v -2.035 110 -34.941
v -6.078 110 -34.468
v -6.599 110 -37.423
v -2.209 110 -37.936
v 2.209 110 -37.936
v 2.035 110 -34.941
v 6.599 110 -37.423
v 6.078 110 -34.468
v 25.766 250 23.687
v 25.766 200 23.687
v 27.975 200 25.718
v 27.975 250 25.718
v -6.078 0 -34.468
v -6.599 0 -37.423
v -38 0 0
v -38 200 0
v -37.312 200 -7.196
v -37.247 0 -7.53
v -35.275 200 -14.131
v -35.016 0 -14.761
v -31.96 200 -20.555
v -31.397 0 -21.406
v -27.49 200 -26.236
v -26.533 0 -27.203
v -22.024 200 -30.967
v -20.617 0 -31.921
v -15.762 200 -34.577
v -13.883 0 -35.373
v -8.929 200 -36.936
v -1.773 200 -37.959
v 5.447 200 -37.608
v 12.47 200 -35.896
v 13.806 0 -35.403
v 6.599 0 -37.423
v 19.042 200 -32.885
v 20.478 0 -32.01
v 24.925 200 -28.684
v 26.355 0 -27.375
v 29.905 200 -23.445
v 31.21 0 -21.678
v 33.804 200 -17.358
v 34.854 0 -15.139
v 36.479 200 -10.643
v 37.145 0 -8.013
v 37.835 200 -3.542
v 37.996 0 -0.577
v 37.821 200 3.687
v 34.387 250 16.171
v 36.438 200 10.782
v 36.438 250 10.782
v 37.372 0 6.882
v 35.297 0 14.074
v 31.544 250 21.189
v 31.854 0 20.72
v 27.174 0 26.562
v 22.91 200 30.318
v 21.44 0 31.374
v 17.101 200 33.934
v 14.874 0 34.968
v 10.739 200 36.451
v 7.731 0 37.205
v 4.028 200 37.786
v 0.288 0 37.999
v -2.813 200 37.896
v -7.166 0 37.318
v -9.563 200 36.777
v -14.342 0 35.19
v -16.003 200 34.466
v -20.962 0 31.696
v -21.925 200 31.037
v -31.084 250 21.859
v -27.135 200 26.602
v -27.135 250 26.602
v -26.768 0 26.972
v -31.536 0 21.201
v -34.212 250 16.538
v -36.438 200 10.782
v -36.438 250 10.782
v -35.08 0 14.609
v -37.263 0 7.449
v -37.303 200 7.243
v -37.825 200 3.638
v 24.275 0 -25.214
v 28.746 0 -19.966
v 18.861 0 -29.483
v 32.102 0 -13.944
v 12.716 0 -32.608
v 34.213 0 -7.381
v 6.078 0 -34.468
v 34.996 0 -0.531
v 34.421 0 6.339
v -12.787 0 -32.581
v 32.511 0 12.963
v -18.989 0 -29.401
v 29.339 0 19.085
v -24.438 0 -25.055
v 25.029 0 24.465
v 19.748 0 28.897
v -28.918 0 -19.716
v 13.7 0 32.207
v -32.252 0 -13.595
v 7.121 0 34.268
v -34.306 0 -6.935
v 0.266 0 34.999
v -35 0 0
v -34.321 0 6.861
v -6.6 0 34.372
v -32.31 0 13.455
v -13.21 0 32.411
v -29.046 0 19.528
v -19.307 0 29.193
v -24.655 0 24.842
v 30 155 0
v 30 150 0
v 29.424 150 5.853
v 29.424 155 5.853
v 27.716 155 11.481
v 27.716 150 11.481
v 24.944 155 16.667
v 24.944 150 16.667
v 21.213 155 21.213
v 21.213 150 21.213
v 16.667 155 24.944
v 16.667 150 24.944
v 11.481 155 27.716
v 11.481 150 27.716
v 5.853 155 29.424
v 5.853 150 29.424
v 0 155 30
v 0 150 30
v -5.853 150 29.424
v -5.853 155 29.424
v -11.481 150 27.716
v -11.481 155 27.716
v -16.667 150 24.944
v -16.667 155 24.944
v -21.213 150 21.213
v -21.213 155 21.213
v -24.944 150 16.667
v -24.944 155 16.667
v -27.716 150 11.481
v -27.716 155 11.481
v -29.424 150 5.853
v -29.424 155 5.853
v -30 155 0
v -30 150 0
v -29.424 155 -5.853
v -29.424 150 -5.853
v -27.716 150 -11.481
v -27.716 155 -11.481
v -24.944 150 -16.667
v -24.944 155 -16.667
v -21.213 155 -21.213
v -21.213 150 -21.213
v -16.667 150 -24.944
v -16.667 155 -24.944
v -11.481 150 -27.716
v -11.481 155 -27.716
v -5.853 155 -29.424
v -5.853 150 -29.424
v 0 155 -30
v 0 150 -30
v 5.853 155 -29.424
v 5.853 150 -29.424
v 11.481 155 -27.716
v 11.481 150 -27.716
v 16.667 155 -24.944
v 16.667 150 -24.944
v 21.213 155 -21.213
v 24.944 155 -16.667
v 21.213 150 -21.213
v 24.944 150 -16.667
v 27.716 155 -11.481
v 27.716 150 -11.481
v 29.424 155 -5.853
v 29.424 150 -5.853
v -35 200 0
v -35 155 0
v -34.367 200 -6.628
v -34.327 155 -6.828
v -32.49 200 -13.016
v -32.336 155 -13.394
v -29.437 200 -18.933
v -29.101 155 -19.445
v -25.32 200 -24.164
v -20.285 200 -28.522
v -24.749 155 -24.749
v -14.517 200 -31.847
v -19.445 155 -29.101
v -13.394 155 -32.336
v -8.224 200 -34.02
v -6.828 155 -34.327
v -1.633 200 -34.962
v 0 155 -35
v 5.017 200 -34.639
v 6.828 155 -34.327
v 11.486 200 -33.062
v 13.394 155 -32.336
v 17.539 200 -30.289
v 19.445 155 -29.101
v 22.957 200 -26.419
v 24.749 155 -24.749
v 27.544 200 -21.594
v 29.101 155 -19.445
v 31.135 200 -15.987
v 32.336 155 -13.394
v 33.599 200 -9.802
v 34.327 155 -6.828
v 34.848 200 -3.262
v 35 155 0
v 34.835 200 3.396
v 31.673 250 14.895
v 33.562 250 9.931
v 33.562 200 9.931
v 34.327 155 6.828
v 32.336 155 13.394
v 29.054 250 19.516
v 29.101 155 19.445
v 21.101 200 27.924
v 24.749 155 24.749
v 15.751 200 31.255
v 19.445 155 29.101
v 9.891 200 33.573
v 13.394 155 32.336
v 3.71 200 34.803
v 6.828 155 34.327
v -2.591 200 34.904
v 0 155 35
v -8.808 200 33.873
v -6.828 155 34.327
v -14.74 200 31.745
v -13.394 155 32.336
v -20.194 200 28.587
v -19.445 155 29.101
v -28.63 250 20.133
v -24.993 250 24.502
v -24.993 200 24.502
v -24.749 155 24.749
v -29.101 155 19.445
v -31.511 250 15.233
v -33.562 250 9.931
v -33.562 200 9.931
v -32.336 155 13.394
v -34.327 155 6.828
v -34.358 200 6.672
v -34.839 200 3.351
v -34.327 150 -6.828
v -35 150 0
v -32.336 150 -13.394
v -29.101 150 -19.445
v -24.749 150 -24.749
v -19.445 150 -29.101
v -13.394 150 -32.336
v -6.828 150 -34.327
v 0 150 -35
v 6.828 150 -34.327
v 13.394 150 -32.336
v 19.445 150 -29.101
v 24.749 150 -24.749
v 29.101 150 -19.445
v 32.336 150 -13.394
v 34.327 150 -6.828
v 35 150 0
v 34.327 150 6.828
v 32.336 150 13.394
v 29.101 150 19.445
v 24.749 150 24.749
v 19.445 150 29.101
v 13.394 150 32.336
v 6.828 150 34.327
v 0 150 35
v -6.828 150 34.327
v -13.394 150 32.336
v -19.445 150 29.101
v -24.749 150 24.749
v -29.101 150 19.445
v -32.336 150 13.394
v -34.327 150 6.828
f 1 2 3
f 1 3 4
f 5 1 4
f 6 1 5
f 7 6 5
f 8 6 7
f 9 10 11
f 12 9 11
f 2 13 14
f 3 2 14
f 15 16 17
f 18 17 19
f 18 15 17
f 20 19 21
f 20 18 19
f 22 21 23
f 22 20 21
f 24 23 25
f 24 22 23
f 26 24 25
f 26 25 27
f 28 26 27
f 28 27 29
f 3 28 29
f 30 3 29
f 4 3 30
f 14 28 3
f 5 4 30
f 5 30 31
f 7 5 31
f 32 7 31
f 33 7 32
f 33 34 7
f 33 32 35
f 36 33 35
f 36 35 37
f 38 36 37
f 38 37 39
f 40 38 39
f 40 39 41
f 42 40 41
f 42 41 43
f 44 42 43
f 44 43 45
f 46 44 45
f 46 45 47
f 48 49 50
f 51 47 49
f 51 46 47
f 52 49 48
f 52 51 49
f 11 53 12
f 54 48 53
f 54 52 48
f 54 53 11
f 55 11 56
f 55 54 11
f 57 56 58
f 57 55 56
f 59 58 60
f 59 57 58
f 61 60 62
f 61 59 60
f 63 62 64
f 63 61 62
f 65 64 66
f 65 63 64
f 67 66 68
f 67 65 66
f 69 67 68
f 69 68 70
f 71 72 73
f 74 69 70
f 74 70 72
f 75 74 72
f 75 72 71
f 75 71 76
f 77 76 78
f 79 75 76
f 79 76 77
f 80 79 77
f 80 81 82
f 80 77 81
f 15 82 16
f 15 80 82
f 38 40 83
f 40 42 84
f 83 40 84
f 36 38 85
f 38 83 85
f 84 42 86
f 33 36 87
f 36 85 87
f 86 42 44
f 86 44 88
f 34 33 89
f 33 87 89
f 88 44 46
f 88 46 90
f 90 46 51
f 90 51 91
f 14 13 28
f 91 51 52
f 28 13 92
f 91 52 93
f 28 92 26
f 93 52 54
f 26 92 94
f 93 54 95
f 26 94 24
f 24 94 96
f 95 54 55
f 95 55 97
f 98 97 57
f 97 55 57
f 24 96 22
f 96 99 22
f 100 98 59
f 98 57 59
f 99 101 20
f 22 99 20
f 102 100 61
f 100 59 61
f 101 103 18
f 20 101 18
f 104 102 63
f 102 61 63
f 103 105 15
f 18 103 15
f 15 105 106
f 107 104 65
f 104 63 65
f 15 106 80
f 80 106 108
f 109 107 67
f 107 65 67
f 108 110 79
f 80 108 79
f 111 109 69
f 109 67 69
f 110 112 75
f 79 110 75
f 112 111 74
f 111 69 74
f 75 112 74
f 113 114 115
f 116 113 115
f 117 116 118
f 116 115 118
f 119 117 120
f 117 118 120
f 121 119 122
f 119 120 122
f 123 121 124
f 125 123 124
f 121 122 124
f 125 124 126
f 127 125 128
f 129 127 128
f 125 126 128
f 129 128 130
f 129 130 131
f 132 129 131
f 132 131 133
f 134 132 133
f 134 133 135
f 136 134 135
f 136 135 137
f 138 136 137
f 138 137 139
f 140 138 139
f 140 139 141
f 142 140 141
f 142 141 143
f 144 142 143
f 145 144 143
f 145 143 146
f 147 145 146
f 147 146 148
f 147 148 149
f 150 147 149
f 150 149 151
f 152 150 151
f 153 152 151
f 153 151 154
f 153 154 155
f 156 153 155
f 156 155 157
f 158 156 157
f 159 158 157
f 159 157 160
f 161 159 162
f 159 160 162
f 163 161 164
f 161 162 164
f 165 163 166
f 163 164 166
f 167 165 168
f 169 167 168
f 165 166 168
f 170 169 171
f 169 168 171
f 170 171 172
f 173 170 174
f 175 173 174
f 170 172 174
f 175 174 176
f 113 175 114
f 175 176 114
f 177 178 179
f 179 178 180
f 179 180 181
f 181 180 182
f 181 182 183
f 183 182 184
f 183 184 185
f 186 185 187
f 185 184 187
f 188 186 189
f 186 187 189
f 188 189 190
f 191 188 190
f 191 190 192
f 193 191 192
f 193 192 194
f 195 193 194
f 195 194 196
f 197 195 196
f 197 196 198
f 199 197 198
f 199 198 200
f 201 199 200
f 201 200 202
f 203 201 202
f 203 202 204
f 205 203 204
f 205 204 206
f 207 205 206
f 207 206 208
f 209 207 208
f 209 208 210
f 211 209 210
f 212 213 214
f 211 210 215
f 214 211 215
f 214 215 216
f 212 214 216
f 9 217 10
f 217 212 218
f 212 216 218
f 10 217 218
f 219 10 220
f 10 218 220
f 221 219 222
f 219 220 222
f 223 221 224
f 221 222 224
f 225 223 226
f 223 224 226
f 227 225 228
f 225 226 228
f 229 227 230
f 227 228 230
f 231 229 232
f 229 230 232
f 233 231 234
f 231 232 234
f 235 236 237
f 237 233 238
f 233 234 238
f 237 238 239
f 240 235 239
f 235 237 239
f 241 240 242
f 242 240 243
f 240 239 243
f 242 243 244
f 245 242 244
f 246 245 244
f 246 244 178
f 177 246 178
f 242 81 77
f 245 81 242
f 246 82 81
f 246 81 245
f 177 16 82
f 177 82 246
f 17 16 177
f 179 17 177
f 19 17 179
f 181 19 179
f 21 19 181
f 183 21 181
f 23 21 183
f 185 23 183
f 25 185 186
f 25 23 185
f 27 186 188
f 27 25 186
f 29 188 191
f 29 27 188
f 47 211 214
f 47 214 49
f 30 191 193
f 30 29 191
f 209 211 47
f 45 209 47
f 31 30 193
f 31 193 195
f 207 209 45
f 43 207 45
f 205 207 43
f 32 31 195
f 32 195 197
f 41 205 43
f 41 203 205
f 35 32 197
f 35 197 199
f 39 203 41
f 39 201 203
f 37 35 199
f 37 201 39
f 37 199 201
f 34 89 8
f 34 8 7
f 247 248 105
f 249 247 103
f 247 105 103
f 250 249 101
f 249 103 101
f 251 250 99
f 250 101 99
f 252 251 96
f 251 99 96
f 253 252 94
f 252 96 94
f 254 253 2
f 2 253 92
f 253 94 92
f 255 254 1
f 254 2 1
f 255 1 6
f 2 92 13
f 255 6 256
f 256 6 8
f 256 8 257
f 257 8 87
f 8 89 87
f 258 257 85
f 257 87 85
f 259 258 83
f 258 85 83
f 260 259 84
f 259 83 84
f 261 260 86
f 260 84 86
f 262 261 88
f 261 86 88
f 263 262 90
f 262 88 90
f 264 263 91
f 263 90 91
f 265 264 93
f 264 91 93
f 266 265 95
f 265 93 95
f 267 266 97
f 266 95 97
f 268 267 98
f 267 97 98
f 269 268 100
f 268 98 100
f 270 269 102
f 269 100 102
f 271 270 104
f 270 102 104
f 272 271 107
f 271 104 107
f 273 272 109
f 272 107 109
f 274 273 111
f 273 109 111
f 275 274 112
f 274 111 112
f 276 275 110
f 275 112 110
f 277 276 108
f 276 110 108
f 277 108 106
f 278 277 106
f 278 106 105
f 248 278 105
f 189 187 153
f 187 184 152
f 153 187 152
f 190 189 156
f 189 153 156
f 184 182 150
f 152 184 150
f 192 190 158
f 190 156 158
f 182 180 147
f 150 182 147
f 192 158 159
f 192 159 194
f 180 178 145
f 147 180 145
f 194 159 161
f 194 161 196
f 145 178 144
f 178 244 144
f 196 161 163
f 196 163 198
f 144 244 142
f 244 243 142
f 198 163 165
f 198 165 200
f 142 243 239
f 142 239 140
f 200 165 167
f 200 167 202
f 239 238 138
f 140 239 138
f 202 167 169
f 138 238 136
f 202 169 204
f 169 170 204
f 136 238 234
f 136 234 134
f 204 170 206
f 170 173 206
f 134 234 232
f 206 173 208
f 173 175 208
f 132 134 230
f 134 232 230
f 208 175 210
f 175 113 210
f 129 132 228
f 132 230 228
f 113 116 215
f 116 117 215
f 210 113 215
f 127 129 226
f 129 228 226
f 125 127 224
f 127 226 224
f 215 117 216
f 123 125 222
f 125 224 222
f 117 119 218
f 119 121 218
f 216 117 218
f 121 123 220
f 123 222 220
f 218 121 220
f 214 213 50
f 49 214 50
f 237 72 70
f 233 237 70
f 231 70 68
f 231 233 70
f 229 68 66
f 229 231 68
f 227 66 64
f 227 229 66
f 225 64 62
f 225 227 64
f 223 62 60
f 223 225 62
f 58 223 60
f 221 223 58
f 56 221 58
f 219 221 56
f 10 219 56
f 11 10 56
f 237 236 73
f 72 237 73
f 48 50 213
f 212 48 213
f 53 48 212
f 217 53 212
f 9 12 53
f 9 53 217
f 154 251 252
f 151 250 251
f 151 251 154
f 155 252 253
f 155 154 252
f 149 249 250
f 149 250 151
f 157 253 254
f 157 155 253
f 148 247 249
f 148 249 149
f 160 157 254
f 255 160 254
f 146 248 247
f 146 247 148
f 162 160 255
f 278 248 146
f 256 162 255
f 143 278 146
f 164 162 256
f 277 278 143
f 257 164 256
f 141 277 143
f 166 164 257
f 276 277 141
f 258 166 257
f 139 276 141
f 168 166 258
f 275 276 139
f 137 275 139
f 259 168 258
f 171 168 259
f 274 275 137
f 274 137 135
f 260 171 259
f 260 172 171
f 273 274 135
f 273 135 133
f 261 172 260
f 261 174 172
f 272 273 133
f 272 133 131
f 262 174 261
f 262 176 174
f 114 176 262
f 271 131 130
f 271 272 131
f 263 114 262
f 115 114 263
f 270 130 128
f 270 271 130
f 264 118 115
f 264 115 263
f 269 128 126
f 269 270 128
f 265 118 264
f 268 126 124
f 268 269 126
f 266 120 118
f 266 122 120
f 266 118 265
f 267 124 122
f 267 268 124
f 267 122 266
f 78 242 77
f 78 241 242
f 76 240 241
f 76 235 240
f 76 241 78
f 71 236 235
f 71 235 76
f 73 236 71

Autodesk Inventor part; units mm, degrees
ref_plane "YZ Plane" through (0, 0, 0) normal (1, 0, 0) x (0, 1, 0)
ref_plane "XZ Plane" through (0, 0, 0) normal (0, 1, 0) x (-1, 0, 0)
ref_plane "XY Plane" through (0, 0, 0) normal (0, 0, 1) x (1, 0, 0)
sketch "スケッチ1" plane through (0, 0, 0) normal (0, 1, 0) x (-1, 0, 0)
  circle A0 centre (0, 0) radius 35
  circle A1 centre (0, 0) radius 38
  dimension "d0" = 70
  dimension "d1" = 76
extrude "押し出し1" add sketch "スケッチ1" along normal blind 250
sketch "スケッチ2" plane through (0, 250, 0) normal (0, 1, 0) x (1, 0, 0)
  circle A0 centre (0, 0) radius 38 projected
  line L0 (0, 0) -> (-27.1351, -26.6024)
  line L1 (0, 0) -> (27.9749, -25.7178)
  line L2 (0, 0) -> (-27.1351, -26.6024)
  circle A1 centre (0, 0) radius 35 projected
  line L3 (0, 0) -> (-36.4384, -10.7818)
  line L4 (0, 0) -> (36.4384, -10.7818)
  point P0 (-32.2602, -20.0818)
  point P1 (33.0208, -18.805)
extrude "押し出し3" cut sketch "スケッチ2" against normal blind 50 contours A0 L4 A1 L3 | L0 A1 L1 A0 | A1 L4 L3 | L0 L1 A1
ref_plane "作業平面2" through (0, 150, 0) normal (0, -1, 0) x (1, 0, 0)
sketch "スケッチ3" plane through (0, 150, 0) normal (0, -1, 0) x (1, 0, 0)
  circle A0 centre (0, 0) radius 35
  circle A1 centre (0, 0) radius 30
  dimension "d10" = 70
  dimension "d11" = 60
extrude "押し出し4" add sketch "スケッチ3" against normal blind 5
sketch "スケッチ4" plane through (0, 0, 0) normal (0, -1, 0) x (1, 0, 0)
  circle A0 centre (0, 0) radius 38 projected
  line L0 (0, 0) -> (6.5986, -37.4227)
  line L1 (0, 0) -> (38, 0) construction
  line L2 (0, 0) -> (-6.5986, -37.4227)
  line L3 (0, 0) -> (38, 0) construction
  dimension "d14" = 80
  dimension "d15" = 100
extrude "押し出し5" cut sketch "スケッチ4" against normal blind 110 contours L2 L0 A0 picked at (0, -25.2905)
properties part number "知能ロボコン大砲１"
